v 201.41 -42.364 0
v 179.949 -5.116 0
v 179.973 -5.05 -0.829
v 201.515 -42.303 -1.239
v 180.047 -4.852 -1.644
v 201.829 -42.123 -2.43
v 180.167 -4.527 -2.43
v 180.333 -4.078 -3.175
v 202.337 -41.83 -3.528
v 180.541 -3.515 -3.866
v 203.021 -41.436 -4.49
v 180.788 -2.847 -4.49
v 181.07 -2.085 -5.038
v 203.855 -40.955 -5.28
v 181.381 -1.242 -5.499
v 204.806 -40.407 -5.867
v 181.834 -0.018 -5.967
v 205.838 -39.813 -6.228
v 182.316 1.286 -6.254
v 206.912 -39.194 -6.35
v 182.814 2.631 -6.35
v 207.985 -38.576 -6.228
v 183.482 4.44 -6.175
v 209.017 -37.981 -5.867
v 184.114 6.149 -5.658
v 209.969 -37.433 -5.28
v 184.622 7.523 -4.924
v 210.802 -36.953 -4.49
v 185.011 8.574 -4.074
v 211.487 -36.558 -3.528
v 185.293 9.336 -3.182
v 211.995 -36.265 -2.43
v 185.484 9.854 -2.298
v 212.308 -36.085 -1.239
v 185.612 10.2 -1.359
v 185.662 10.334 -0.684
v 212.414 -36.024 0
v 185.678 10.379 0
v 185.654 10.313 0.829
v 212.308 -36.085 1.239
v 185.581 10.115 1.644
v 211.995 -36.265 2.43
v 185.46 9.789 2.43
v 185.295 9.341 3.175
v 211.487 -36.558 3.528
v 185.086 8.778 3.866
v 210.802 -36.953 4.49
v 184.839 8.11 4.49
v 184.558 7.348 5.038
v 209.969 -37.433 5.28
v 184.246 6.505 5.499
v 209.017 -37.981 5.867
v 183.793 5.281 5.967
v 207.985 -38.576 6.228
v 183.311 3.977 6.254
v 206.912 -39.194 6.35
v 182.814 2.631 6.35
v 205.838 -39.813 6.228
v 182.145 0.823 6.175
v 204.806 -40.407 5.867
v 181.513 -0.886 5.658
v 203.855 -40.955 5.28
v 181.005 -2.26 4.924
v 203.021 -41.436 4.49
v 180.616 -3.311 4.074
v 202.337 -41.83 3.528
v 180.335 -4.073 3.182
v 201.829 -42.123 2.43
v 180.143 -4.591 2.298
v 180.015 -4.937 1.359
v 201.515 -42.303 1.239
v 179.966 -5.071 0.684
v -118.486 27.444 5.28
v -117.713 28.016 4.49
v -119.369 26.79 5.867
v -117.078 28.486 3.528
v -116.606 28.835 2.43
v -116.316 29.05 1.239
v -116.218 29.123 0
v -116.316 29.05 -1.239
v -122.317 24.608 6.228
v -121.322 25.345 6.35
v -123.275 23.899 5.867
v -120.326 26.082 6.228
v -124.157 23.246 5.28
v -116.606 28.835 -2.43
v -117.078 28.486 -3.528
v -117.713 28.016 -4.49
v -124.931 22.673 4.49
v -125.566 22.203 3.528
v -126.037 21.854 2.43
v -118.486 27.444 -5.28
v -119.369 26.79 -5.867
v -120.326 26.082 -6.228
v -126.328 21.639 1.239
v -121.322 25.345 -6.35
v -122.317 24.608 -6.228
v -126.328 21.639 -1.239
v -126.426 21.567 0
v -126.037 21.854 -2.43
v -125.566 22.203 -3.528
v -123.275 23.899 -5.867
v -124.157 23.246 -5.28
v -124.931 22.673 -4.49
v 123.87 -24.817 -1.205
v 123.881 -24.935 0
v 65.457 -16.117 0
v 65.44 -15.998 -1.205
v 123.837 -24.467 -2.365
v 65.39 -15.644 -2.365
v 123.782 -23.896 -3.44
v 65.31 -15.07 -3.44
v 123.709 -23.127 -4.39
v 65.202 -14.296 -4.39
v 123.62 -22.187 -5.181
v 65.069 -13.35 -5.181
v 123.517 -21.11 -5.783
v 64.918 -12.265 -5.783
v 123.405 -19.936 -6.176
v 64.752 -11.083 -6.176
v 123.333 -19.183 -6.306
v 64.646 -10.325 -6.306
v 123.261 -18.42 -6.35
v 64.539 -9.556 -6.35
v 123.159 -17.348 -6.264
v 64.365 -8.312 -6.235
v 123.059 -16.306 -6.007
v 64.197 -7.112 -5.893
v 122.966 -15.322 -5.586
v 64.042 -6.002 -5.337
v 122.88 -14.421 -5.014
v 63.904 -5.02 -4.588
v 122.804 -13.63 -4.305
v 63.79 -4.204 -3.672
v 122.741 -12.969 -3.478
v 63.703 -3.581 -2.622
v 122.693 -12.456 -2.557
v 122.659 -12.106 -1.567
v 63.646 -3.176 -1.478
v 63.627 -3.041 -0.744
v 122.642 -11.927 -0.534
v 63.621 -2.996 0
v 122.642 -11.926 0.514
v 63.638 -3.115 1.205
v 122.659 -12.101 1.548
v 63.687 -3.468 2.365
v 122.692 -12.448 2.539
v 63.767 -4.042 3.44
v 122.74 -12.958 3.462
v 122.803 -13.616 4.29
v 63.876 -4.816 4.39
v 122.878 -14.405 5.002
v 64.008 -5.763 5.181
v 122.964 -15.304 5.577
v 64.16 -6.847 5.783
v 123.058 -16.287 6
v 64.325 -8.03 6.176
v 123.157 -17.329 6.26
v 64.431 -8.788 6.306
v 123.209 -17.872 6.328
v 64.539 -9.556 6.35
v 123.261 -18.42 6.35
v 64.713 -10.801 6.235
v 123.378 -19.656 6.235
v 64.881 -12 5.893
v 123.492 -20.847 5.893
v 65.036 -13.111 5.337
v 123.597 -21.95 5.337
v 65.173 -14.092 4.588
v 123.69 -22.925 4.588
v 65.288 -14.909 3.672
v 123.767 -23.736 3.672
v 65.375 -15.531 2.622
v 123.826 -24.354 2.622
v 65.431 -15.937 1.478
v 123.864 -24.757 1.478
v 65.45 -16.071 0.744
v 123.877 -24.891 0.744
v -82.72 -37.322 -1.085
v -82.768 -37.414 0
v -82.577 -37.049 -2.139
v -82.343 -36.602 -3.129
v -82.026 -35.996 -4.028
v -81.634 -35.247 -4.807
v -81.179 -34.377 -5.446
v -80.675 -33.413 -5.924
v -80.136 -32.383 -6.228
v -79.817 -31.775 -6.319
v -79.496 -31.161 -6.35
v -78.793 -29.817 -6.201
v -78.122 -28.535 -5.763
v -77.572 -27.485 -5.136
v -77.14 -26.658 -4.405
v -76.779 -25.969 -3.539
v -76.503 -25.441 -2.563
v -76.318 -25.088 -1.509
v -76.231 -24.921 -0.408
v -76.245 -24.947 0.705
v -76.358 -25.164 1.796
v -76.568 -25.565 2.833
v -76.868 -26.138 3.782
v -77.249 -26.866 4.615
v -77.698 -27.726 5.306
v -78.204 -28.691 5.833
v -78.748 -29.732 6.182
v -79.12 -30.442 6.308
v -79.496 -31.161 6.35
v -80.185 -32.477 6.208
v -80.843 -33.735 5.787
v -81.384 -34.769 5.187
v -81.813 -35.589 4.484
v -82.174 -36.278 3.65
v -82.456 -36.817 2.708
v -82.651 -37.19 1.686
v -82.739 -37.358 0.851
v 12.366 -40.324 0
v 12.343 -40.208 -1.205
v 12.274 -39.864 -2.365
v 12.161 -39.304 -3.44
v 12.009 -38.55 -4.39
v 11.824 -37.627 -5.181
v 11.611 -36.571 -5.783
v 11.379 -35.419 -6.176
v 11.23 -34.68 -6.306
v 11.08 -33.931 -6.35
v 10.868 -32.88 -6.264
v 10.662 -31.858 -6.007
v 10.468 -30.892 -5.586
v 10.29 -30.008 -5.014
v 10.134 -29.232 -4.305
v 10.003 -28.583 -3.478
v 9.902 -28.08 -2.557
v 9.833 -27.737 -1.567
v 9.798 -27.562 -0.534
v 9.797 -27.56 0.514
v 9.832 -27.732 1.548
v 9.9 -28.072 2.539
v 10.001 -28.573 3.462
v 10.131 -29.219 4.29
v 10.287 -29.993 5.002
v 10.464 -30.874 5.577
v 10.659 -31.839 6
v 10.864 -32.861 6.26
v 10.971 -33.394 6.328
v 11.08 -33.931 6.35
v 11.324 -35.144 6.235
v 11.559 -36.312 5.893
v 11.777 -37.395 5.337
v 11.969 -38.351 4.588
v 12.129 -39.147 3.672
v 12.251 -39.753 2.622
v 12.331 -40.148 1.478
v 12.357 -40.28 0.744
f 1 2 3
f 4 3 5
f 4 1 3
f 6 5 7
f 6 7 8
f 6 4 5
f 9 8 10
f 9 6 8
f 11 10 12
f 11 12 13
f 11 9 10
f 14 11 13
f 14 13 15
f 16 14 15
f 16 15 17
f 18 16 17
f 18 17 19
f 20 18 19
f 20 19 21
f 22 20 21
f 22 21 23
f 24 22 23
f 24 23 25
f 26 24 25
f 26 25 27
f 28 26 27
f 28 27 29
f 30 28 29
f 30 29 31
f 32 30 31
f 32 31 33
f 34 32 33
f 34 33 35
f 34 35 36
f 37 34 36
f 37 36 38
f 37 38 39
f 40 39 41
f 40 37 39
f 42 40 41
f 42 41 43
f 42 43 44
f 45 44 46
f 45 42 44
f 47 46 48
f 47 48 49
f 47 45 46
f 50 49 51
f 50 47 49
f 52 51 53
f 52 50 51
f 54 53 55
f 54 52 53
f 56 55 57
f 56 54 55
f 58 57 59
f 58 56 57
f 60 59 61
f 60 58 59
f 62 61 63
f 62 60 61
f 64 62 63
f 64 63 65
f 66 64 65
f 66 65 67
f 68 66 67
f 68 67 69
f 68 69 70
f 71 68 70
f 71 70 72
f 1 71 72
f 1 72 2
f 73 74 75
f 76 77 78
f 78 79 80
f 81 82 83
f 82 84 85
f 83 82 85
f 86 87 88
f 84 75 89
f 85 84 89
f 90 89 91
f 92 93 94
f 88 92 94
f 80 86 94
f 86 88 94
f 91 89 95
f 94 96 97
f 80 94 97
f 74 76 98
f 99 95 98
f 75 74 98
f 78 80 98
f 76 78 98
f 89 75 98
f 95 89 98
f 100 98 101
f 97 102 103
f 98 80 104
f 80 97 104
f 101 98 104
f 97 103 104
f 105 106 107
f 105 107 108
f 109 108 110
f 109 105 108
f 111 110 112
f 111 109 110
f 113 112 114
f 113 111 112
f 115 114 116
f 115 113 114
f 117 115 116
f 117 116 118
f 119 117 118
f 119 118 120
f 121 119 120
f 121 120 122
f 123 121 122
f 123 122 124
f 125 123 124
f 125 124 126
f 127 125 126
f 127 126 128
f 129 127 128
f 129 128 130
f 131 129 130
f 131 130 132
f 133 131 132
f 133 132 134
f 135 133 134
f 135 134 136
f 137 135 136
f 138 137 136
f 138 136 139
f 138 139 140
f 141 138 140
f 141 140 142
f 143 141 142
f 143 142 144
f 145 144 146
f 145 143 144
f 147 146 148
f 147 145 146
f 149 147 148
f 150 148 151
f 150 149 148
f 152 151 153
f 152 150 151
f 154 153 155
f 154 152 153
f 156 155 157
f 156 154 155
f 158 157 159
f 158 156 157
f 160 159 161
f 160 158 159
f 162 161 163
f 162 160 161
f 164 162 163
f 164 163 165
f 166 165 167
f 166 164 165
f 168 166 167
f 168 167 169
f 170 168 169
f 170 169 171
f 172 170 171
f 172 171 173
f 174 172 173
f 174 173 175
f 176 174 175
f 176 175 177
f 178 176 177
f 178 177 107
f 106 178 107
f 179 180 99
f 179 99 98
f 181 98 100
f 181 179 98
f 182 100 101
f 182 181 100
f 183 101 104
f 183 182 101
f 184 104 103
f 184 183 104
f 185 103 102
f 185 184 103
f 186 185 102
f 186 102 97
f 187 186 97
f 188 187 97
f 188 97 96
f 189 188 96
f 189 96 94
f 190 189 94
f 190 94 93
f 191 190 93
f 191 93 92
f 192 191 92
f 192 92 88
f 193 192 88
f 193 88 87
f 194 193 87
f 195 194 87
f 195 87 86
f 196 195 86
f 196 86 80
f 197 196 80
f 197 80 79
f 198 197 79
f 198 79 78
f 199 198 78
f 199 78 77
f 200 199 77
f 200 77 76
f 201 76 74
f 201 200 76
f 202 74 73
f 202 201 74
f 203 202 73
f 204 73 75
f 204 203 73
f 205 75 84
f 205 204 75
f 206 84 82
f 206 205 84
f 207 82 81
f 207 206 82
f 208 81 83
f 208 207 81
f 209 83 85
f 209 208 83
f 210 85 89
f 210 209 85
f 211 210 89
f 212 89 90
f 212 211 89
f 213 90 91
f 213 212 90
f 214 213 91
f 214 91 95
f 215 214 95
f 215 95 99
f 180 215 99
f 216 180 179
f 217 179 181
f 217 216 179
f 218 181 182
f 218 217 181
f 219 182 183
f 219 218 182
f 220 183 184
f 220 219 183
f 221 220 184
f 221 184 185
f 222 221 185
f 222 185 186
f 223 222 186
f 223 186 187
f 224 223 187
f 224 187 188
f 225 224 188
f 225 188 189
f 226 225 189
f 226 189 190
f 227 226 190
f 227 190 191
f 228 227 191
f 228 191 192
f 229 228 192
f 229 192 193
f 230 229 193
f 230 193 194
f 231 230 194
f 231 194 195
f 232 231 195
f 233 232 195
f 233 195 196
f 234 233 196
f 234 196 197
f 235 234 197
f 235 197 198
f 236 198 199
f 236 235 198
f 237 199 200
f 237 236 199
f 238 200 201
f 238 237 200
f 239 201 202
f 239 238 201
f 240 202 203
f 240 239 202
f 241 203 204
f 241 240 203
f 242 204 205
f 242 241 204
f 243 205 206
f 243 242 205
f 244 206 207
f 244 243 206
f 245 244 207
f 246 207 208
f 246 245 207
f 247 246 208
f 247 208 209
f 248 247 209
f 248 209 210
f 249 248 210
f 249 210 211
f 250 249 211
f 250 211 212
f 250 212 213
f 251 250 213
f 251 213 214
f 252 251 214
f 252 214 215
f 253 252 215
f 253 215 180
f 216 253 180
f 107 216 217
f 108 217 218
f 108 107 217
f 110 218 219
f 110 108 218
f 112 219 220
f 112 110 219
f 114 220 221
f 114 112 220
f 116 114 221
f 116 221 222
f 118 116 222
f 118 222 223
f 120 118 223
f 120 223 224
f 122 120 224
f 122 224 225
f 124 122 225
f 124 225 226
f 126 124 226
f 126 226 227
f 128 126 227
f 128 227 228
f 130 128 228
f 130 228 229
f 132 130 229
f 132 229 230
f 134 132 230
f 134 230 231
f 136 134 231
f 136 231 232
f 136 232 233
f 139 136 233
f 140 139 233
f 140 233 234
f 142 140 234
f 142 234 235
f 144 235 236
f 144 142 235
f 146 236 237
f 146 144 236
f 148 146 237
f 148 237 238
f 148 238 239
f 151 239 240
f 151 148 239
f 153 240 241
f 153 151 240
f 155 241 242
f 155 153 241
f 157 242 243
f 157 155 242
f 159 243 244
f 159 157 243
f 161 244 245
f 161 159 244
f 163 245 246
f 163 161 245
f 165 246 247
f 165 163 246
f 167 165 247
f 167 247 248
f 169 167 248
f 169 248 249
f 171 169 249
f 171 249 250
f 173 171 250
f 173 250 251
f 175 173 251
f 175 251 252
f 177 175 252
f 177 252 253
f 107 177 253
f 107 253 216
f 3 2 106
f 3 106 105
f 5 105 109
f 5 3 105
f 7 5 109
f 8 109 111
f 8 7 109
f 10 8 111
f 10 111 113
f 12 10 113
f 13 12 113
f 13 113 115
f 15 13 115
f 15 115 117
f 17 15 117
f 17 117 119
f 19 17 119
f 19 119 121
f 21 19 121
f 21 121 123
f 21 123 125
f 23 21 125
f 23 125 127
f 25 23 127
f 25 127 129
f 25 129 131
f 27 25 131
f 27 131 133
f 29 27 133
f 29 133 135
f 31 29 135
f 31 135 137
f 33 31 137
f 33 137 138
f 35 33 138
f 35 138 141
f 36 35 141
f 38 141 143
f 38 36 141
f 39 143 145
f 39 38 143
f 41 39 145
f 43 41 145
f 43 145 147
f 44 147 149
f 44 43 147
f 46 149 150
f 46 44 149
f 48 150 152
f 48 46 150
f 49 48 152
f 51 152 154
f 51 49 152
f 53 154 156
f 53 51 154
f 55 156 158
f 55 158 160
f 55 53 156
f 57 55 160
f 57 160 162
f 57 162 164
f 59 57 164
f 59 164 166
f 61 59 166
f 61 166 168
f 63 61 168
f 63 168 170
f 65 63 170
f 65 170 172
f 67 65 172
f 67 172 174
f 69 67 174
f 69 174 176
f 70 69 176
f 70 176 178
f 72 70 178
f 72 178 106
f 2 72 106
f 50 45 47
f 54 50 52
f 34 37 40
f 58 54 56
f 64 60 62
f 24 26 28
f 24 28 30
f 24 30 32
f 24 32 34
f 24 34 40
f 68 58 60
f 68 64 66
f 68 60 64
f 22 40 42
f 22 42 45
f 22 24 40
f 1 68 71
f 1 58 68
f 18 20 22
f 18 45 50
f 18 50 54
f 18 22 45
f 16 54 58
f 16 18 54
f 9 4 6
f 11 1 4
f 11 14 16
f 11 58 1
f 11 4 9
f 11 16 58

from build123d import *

# Parameters (mm, degrees)
SWEEP1_PROFILE_R = 6.35


with BuildPart() as part:
    # Sweep1: sweep along a path in Sketch2
    with BuildLine(Plane.XY) as sweep1_path:
        Line((-121.321774851, 25.344617349), (-79.496231466, -31.161414773))
        Line((-79.496231466, -31.161414773), (11.079614142, -33.931318309))
        Line((11.079614142, -33.931318309), (64.538752375, -9.556167197))
        Line((64.538752375, -9.556167197), (123.260707326, -18.419858511))
        Line((123.260707326, -18.419858511), (182.813633337, 2.631408359))
        Line((182.813633337, 2.631408359), (206.911794096, -39.194135026))
    # Sweep1 profile (on start of the path) → Sweep1 (sweep)
    with BuildSketch(Plane(origin=(-121.321774851, 25.344617349, 0), x_dir=(-0.8037665341662223, -0.5949448365642138, 0), z_dir=(0.5949448365642138, -0.8037665341662223, 0))):
        Circle(SWEEP1_PROFILE_R)
    sweep(path=sweep1_path.line, transition=Transition.RIGHT)


solid = part.part
